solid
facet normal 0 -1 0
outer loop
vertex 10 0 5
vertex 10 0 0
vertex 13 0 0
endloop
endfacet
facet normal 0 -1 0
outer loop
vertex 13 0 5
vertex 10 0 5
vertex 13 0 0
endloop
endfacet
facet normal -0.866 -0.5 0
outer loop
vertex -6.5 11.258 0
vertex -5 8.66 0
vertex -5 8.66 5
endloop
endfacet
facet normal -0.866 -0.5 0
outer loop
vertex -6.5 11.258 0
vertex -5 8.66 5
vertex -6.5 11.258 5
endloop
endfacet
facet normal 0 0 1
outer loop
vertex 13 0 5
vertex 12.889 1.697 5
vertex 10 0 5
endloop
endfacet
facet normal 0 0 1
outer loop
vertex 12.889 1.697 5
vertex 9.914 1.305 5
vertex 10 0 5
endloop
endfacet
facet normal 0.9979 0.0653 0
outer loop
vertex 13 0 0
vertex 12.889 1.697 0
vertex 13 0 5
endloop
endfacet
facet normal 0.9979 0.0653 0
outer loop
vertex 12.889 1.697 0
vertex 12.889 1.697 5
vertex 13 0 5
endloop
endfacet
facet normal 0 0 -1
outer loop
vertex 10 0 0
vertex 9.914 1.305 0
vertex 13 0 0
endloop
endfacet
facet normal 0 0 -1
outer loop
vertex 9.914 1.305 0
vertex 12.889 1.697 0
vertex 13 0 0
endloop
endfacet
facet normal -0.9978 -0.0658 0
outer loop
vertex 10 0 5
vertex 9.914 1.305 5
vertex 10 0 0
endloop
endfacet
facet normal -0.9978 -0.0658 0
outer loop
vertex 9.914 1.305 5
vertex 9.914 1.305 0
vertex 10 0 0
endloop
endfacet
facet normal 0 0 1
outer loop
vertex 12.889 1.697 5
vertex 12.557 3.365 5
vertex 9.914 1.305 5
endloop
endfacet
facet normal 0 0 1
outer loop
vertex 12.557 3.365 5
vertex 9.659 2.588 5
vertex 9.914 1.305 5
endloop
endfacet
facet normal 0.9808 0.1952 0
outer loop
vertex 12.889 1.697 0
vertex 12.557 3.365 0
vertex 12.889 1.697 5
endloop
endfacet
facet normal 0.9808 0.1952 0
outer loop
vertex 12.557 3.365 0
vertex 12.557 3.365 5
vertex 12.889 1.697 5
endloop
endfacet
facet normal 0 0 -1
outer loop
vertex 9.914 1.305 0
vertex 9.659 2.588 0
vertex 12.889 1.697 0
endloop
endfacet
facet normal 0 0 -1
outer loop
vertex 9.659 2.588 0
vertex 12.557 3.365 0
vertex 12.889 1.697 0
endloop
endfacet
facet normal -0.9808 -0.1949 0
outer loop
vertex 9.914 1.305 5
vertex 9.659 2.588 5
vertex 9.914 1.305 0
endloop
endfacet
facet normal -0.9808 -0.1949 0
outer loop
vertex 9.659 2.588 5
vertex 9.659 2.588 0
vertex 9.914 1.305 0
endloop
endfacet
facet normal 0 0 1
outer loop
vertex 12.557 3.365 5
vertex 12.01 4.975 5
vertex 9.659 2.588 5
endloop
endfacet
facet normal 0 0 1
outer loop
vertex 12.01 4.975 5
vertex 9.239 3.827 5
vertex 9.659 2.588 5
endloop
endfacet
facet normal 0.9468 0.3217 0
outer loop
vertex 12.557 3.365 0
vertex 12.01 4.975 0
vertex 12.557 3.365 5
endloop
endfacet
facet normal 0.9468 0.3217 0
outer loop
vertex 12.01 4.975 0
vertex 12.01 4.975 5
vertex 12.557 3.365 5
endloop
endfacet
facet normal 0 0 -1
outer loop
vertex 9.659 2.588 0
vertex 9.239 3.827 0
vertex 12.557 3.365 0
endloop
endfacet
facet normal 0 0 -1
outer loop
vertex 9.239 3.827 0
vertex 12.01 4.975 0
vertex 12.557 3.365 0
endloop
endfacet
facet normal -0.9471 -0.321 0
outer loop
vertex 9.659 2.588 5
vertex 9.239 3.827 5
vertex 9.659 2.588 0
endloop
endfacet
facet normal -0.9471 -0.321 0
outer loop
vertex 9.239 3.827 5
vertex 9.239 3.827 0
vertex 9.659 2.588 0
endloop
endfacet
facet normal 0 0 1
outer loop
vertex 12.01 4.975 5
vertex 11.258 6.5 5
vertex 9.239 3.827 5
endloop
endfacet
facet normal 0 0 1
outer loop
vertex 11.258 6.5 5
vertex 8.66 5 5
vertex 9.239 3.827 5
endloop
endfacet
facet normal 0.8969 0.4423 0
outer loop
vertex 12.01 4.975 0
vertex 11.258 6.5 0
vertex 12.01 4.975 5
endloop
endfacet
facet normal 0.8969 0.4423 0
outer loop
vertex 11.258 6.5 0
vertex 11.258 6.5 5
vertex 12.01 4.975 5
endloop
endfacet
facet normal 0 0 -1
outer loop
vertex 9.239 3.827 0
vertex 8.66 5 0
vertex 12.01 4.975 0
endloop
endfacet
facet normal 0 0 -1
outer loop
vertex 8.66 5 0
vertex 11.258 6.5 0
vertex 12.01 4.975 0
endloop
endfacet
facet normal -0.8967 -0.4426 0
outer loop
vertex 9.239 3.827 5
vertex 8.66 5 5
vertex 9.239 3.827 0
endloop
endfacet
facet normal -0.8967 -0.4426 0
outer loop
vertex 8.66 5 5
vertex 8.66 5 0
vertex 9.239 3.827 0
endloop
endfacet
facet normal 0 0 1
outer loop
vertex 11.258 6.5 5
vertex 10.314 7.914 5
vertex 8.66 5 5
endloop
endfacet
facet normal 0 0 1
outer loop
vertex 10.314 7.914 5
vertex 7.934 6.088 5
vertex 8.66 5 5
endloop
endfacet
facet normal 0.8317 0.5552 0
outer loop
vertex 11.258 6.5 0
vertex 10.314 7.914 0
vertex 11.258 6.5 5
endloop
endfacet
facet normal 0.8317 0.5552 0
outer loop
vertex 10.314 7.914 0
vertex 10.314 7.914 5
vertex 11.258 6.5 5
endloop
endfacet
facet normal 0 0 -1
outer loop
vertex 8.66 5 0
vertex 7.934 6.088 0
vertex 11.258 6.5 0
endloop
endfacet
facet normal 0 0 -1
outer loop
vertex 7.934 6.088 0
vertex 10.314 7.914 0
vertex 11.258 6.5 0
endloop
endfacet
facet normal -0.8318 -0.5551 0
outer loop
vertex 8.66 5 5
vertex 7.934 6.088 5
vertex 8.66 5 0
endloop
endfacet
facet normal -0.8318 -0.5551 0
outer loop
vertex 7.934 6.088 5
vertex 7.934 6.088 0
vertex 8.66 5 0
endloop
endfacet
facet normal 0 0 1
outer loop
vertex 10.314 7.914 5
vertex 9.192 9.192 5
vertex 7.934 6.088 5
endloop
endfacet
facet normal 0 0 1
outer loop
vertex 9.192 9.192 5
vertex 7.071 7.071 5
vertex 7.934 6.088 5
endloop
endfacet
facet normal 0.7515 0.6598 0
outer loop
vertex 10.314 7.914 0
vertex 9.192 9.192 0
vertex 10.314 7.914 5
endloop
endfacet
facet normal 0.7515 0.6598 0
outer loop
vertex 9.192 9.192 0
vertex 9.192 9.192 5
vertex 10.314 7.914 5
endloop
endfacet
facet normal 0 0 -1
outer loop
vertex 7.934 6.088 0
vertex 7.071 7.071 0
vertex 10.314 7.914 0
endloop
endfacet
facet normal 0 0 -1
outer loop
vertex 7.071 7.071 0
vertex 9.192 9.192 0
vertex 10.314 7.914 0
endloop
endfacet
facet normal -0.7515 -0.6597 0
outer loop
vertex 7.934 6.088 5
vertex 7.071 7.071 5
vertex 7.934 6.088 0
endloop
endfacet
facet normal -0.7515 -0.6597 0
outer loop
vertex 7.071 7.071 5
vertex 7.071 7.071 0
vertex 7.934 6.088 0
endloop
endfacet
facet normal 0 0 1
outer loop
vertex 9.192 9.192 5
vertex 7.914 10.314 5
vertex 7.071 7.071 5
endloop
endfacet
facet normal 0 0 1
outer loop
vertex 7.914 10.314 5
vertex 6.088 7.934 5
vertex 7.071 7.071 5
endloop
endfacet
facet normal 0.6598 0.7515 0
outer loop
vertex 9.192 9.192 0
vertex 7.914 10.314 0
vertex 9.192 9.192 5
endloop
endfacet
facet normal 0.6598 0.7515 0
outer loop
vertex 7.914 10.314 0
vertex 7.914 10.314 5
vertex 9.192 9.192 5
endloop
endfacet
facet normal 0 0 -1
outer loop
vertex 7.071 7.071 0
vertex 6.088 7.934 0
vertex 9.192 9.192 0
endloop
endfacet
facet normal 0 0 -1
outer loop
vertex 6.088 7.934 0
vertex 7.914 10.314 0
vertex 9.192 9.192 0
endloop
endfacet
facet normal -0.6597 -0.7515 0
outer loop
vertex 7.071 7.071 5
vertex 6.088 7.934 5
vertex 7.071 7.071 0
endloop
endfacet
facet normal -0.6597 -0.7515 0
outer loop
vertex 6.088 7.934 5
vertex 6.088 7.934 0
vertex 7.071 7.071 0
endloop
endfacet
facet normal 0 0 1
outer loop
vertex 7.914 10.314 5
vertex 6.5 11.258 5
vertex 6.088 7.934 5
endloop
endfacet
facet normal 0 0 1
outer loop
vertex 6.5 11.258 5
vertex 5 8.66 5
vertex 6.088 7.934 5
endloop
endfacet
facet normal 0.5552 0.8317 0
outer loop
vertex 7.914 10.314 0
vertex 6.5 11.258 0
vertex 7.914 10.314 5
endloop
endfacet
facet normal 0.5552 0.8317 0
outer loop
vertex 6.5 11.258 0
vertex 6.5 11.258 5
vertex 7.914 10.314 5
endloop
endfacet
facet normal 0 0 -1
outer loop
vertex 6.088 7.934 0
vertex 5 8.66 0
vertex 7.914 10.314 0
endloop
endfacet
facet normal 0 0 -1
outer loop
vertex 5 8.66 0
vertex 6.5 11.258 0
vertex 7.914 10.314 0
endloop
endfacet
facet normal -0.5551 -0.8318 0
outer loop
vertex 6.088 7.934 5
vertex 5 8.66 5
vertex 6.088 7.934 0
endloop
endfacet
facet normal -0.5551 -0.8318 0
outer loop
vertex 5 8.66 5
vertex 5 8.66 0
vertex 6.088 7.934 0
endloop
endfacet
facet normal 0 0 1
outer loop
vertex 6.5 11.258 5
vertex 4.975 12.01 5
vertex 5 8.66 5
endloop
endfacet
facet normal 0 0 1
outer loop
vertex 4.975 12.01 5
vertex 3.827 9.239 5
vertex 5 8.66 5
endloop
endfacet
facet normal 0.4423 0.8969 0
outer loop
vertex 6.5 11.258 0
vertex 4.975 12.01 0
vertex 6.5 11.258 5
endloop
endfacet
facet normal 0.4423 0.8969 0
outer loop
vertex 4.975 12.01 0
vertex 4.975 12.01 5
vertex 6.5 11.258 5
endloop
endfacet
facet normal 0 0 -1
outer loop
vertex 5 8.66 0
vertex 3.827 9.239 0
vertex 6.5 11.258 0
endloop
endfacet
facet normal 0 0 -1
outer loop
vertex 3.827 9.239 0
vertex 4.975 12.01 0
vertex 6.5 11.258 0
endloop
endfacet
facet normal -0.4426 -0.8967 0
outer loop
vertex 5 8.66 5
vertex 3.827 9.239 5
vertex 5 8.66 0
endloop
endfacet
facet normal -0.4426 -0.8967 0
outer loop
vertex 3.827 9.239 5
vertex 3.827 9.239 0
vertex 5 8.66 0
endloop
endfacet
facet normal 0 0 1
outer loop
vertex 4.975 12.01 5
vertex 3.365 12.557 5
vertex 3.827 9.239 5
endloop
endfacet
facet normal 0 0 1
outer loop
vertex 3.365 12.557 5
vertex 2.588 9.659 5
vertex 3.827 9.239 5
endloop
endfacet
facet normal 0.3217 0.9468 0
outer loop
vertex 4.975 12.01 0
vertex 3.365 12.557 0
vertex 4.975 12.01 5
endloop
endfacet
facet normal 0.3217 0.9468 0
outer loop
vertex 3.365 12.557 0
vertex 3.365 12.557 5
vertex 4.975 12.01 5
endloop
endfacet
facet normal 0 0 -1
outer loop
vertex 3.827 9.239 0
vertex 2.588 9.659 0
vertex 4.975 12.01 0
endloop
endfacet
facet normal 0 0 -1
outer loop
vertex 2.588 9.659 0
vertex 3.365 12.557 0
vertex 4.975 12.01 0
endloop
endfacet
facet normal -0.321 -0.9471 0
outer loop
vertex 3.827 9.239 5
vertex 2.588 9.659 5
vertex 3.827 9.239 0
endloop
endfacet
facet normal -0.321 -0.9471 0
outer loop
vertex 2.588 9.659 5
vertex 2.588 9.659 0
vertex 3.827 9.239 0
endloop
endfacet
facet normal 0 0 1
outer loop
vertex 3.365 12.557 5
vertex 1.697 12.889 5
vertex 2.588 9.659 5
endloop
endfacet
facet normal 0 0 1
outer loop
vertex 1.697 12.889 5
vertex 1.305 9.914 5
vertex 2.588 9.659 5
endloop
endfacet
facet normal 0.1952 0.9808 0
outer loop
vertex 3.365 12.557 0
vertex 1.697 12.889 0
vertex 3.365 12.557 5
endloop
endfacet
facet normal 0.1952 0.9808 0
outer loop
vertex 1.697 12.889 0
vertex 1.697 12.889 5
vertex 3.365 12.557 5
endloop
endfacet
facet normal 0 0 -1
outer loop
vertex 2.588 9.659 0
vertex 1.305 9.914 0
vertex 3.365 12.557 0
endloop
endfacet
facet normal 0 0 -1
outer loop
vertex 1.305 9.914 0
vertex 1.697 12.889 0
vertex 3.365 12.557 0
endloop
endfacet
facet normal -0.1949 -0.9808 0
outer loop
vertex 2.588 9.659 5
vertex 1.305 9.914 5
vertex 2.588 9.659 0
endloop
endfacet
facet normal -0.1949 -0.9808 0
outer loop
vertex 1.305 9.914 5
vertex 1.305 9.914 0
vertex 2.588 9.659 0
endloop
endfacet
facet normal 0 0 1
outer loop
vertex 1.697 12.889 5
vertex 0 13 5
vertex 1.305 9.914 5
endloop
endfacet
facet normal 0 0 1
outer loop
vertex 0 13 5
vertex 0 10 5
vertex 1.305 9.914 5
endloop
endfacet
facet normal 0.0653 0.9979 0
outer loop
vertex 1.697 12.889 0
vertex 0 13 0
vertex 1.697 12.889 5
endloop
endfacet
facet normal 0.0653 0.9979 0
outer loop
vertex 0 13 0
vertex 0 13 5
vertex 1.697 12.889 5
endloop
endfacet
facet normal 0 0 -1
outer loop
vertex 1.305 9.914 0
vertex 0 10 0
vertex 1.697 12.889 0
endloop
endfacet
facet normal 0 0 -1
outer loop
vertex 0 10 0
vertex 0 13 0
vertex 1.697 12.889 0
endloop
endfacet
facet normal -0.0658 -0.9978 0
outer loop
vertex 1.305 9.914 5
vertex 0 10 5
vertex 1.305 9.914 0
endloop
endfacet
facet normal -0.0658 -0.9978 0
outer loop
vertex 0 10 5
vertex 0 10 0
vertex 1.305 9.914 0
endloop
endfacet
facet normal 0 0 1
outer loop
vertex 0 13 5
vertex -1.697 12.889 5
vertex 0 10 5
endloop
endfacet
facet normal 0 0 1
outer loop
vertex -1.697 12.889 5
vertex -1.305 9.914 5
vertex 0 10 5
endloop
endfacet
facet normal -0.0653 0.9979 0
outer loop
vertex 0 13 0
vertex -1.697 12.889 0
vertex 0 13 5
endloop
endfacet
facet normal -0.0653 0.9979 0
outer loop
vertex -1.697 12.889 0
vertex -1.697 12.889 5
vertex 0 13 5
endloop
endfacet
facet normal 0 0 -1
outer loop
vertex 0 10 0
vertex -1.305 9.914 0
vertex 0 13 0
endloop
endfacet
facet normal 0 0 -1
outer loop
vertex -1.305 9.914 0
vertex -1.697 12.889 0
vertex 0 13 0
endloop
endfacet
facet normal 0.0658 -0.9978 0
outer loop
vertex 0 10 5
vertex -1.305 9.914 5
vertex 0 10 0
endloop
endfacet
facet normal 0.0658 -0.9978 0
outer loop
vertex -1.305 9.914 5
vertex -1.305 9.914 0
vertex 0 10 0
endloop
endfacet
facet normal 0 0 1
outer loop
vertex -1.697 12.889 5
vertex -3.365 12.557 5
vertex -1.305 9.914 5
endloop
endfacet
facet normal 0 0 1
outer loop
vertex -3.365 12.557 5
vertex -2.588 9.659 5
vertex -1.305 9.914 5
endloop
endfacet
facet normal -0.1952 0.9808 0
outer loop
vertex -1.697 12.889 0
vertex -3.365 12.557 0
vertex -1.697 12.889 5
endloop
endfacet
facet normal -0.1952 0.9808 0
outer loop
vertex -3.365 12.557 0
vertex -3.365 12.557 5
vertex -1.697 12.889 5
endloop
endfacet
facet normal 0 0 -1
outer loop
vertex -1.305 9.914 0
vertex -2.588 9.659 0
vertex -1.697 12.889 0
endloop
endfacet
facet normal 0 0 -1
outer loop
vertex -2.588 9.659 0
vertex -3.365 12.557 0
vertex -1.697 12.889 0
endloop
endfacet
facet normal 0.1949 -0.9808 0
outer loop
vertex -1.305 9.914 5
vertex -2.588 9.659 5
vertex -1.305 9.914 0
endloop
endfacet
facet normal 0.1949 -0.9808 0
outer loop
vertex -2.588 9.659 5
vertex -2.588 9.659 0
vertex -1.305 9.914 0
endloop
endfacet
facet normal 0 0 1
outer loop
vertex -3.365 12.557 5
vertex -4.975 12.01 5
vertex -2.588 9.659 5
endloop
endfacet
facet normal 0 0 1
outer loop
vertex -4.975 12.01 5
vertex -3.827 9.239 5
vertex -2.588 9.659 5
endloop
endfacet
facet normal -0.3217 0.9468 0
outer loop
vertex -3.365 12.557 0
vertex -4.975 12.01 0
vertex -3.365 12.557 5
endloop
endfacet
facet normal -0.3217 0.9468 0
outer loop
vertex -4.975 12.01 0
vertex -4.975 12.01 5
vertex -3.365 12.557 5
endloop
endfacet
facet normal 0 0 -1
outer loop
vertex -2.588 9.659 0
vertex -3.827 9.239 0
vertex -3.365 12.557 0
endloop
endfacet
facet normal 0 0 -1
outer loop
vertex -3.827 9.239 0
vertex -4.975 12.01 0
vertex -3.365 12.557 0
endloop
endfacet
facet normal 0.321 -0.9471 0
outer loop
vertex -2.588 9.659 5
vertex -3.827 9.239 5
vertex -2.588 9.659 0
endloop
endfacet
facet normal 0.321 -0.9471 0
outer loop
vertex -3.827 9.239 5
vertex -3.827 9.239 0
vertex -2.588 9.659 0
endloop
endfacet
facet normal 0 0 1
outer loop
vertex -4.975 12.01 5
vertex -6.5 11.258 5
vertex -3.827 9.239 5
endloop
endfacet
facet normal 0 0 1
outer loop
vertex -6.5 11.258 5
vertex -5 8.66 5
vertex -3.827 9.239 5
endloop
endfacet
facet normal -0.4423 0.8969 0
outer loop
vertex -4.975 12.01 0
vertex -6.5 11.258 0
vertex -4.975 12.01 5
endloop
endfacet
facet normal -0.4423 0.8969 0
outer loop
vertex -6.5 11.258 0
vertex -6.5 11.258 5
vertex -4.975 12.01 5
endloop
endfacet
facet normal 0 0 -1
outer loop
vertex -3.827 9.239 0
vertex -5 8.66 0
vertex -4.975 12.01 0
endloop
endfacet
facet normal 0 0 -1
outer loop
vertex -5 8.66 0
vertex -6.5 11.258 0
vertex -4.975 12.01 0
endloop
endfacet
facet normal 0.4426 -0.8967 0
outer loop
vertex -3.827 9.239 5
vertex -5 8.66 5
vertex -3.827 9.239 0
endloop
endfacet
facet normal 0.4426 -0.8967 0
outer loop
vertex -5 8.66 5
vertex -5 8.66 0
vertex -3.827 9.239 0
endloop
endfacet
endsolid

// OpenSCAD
// oracle: vol-tol 0.005 bbox-tol 0.02
rotate_extrude(angle=120, $fn=48) translate([10,0]) square([3,5]);
